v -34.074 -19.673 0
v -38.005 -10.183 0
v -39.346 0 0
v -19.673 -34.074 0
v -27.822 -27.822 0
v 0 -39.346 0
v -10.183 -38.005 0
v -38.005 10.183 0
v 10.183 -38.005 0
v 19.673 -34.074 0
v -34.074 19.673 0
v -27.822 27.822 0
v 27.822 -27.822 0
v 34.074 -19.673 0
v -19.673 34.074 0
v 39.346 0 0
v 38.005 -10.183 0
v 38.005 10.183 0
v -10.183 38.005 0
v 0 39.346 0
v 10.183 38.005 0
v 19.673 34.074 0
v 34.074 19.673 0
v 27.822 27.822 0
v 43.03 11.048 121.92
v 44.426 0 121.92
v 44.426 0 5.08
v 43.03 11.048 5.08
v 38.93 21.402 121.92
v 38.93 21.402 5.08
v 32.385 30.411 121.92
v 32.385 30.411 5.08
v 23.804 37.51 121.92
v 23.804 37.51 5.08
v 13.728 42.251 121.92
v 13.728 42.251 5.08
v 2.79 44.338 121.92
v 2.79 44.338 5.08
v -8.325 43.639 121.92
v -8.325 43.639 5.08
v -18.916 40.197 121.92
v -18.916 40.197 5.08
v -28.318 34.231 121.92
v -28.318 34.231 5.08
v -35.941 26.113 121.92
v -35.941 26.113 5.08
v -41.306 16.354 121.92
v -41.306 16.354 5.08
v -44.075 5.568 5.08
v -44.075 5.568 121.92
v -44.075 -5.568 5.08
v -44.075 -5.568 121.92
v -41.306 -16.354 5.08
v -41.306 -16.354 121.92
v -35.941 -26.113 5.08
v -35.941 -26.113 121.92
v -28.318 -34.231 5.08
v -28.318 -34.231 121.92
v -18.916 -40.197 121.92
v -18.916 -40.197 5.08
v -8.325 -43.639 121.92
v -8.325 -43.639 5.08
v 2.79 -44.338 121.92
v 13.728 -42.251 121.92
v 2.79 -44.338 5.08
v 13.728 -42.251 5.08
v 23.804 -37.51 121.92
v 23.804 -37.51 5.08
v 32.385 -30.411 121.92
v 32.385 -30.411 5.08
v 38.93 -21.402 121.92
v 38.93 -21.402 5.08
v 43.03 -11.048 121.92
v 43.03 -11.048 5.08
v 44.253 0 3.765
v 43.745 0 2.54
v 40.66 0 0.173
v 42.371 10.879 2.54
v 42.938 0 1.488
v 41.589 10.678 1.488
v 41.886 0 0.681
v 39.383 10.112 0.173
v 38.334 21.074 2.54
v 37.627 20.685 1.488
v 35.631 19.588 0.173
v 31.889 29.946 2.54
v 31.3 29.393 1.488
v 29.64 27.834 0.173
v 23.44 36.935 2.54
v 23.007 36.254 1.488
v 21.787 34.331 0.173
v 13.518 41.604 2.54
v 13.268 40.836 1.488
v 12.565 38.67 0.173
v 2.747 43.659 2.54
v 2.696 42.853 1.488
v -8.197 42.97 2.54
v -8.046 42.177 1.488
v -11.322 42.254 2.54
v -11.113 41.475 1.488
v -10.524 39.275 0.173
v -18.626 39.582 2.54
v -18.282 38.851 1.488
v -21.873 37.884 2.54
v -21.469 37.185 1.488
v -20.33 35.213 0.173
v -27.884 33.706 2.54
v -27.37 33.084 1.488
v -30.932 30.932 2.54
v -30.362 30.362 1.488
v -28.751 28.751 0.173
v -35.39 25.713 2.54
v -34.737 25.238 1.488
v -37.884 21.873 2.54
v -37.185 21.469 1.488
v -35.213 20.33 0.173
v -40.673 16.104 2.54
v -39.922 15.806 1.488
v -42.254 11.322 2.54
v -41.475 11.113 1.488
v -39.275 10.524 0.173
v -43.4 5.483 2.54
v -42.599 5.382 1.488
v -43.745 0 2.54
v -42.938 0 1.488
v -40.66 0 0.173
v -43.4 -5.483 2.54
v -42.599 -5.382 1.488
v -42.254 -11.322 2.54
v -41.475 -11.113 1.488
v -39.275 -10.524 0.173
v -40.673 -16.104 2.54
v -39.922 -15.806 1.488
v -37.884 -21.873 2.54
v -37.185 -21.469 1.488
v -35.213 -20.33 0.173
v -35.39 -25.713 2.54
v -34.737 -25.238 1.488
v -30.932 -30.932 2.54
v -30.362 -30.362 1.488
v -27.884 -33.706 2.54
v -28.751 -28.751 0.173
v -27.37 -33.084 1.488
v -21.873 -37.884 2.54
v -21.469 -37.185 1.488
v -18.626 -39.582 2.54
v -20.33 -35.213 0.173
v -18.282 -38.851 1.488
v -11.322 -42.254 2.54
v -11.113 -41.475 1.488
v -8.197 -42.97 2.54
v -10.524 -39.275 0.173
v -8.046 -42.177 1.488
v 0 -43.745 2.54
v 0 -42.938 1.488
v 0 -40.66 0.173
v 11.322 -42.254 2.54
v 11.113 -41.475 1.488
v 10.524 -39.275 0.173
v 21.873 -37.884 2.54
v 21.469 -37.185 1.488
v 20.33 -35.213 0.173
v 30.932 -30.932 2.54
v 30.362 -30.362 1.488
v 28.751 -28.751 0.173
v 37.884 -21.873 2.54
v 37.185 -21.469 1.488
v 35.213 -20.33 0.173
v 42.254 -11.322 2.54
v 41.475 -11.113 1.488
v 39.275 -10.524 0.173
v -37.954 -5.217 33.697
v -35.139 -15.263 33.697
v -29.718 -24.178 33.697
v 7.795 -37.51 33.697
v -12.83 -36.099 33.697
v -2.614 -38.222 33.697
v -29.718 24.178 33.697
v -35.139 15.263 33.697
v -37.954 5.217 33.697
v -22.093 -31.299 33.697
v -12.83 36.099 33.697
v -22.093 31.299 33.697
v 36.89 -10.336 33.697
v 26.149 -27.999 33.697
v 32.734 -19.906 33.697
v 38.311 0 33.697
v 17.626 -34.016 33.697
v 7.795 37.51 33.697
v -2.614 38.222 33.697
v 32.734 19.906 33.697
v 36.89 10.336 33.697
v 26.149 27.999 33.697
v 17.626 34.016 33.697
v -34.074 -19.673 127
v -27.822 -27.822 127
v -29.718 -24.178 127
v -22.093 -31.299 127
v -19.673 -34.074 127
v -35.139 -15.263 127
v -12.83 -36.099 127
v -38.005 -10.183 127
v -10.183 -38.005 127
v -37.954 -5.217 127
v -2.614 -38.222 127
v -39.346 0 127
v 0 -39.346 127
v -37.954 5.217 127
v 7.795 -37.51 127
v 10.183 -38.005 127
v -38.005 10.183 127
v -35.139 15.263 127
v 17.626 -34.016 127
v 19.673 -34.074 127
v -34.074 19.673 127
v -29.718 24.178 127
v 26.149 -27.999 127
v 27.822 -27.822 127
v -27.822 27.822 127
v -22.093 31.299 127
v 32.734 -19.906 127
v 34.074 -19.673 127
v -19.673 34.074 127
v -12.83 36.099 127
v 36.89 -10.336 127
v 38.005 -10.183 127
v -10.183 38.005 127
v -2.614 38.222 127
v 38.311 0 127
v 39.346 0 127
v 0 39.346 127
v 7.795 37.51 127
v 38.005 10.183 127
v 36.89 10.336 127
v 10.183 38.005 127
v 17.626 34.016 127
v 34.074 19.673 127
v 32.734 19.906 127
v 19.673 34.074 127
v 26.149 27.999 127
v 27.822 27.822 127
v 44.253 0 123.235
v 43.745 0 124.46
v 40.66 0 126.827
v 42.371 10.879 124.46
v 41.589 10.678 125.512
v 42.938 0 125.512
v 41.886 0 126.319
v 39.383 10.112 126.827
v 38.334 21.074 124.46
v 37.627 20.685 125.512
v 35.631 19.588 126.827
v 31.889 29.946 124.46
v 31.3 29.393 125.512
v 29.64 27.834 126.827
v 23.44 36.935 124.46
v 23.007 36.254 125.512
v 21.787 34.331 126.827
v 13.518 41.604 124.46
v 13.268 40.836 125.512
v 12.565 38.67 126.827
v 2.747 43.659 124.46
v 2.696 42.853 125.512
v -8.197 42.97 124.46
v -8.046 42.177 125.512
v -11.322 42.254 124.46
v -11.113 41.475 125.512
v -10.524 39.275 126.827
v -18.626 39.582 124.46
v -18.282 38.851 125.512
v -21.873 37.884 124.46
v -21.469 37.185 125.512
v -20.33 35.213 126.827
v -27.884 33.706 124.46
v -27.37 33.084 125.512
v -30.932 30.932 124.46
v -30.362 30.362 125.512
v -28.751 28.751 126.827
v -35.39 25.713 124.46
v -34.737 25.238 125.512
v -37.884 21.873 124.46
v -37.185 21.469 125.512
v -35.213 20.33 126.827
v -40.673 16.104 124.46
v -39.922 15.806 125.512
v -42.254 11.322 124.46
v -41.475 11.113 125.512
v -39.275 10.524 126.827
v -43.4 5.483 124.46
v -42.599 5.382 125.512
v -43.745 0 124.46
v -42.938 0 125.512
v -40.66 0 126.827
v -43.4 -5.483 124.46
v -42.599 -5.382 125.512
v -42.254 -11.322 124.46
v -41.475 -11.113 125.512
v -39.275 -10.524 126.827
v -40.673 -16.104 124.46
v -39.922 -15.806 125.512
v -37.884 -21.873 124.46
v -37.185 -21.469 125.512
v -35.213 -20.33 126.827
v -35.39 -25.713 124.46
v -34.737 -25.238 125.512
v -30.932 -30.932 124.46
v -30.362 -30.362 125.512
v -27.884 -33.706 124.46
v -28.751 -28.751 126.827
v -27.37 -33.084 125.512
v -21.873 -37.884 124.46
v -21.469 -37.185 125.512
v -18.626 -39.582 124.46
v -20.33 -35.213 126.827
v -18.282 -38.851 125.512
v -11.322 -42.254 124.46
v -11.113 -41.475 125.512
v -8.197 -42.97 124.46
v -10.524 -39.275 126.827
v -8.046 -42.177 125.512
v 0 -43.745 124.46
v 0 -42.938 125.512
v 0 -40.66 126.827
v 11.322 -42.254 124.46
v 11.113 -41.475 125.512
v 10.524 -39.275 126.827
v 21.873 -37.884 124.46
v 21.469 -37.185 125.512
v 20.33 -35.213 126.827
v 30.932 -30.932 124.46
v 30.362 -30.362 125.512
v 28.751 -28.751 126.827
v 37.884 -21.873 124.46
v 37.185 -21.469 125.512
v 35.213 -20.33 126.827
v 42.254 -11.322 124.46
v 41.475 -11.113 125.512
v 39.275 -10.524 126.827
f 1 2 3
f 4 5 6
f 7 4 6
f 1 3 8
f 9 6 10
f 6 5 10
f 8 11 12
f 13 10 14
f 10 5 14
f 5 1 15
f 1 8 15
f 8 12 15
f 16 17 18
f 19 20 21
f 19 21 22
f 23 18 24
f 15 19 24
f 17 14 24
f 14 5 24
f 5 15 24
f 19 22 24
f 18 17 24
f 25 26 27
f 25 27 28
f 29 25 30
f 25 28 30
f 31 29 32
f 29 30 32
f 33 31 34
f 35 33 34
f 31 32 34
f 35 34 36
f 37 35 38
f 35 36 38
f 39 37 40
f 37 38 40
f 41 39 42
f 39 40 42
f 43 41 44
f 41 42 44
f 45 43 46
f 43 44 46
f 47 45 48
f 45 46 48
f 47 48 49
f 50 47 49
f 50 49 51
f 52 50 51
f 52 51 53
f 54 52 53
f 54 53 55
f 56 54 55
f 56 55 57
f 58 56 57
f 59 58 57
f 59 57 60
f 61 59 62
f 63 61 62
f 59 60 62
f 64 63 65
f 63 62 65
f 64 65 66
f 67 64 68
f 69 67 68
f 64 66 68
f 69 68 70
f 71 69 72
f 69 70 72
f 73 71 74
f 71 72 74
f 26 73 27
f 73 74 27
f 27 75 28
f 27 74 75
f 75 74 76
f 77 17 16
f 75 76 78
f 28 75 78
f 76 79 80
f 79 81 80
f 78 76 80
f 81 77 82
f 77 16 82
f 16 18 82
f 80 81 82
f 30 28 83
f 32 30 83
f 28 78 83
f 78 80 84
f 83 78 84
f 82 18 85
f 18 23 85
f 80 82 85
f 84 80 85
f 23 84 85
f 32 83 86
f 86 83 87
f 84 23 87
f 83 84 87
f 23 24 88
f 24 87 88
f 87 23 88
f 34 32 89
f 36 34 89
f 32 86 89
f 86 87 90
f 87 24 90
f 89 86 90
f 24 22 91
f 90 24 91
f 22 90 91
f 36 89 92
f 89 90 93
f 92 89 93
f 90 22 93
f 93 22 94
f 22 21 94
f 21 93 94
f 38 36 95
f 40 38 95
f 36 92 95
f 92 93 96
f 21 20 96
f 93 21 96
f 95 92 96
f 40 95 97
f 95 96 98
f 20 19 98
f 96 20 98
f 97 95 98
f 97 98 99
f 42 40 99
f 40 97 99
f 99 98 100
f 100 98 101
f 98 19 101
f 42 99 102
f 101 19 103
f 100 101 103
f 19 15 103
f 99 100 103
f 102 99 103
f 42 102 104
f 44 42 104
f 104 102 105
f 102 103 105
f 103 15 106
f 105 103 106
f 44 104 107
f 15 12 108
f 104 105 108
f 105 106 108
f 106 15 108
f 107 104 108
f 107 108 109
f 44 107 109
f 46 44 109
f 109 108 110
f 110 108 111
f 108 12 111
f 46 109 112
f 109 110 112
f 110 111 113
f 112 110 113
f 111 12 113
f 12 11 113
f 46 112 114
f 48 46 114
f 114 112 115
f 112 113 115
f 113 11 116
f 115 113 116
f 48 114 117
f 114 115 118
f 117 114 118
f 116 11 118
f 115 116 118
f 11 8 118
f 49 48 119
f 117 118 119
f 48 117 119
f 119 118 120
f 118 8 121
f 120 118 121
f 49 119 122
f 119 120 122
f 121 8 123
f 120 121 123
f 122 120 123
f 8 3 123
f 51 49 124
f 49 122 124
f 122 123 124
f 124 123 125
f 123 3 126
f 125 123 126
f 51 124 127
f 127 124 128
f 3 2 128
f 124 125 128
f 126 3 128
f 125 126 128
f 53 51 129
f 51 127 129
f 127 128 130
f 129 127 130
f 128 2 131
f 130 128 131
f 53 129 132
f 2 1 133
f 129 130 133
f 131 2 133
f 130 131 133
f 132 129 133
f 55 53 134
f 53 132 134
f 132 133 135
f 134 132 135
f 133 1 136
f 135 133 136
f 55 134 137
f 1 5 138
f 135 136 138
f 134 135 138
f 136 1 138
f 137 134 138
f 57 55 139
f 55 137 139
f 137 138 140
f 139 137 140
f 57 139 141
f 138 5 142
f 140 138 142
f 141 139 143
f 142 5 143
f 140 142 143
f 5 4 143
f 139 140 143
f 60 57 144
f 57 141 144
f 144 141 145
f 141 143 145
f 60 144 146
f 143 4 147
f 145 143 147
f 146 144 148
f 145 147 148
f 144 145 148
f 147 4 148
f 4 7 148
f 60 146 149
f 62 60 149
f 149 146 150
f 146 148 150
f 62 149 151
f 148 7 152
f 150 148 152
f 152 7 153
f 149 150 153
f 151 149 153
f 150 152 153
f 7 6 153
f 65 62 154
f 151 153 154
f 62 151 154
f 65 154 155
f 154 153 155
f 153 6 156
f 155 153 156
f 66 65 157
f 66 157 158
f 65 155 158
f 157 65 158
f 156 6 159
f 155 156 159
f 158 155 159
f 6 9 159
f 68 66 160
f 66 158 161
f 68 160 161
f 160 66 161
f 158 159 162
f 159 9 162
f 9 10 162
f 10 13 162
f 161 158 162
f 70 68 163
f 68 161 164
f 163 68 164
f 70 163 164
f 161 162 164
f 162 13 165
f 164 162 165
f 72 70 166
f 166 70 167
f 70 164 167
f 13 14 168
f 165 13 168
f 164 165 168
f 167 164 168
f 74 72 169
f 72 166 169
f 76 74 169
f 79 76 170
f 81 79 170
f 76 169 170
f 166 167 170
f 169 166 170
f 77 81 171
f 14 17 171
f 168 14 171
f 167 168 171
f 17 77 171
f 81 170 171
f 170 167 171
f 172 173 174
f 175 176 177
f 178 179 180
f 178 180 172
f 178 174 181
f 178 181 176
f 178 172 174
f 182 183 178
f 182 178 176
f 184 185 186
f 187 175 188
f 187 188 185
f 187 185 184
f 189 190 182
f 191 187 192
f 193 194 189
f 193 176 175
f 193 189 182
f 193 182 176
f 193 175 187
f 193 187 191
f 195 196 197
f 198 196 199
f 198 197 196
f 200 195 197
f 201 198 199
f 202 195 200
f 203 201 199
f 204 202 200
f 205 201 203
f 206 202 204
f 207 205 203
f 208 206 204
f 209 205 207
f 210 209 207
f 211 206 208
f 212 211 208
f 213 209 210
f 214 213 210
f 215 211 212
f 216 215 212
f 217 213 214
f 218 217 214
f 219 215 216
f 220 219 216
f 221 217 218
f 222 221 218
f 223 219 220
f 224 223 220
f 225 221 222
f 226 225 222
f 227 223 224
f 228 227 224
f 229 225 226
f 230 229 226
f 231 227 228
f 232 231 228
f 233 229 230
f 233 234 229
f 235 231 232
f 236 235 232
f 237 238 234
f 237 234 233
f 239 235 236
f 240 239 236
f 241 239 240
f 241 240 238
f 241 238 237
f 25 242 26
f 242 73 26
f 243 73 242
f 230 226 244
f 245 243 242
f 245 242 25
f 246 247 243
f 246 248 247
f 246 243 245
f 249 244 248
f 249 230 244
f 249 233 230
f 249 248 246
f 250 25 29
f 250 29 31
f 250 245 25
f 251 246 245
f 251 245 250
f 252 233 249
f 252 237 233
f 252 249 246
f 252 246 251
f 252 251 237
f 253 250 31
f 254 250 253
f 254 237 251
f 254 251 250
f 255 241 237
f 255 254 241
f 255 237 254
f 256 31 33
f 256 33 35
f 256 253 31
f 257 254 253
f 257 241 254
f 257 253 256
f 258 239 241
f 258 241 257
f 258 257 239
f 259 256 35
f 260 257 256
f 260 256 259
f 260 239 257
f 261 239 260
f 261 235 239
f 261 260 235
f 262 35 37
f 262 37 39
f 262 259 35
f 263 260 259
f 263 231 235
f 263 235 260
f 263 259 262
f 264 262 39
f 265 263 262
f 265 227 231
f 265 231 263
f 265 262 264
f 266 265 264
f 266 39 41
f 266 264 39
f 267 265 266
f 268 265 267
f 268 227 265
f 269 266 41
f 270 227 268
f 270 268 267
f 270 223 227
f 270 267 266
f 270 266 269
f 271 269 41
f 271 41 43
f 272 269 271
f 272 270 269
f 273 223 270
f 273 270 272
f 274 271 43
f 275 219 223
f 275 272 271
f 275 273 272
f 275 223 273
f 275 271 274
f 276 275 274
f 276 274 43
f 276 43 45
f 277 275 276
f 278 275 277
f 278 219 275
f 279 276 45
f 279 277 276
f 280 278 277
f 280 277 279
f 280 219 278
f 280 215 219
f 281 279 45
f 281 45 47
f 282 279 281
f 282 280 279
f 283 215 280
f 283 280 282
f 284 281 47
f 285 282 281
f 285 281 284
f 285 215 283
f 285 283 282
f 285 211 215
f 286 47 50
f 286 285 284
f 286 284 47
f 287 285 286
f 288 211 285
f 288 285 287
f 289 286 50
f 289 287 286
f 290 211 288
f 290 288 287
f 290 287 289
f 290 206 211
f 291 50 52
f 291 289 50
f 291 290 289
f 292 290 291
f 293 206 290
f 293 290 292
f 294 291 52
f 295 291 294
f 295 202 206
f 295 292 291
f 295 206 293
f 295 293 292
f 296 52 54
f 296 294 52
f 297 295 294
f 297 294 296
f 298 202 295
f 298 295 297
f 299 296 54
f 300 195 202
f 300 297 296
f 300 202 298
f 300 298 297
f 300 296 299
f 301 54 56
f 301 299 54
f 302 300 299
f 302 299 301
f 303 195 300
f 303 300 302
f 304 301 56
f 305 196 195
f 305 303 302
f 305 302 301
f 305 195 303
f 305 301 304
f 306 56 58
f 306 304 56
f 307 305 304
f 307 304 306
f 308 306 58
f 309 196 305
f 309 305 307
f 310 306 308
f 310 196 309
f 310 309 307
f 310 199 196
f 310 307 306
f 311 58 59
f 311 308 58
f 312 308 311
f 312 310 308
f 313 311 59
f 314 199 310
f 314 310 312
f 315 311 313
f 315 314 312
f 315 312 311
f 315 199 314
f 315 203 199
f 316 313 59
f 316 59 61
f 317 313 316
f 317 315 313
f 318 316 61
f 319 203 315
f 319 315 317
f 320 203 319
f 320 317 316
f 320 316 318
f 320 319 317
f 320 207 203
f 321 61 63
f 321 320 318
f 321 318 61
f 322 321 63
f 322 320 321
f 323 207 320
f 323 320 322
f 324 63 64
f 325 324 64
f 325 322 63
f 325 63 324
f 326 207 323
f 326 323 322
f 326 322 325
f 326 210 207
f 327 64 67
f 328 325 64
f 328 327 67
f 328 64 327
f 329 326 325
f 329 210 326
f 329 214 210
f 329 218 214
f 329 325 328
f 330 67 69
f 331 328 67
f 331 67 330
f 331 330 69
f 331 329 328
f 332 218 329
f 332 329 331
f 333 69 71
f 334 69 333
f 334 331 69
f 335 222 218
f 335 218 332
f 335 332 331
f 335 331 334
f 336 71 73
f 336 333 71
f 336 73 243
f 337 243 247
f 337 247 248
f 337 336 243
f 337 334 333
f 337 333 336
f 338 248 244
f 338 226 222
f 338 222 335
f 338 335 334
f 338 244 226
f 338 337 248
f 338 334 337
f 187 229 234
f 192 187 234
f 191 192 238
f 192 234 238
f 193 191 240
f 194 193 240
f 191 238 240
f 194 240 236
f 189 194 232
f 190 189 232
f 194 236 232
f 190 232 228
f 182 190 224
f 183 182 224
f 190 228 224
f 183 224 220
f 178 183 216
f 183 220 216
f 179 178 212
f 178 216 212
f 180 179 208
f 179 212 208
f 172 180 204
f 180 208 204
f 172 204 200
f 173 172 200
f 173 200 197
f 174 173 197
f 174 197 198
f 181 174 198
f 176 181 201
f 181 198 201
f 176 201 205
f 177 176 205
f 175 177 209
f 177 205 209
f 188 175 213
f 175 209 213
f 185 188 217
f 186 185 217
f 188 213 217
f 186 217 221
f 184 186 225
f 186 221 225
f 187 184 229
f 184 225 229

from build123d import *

# Parameters (mm, degrees)
F0_R     = 44.425612
F1_DEPTH = 127
F2_R     = 38.311037
F3_DEPTH = 93.30304
F4_R     = 5.08
F5_R     = 5.08


with BuildPart() as f1:
    # F0 (on Top) → F1 (new body)
    with BuildSketch(Plane.XY):
        Circle(F0_R)
    extrude(amount=F1_DEPTH)

    # F2 (on face) → F3 (cut)
    with BuildSketch(Plane.XY.offset(127)):
        Circle(F2_R)
    extrude(amount=-F3_DEPTH, mode=Mode.SUBTRACT)

    # F4
    f4_edges = [f1.edges().sort_by_distance(p)[0] for p in [
        (-44.425612, 0, 127),
    ]]
    fillet(f4_edges, radius=F4_R)

    # F5
    f5_edges = [f1.edges().sort_by_distance(p)[0] for p in [
        (-44.425612, 0, 0),
    ]]
    fillet(f5_edges, radius=F5_R)


solid = f1.part
